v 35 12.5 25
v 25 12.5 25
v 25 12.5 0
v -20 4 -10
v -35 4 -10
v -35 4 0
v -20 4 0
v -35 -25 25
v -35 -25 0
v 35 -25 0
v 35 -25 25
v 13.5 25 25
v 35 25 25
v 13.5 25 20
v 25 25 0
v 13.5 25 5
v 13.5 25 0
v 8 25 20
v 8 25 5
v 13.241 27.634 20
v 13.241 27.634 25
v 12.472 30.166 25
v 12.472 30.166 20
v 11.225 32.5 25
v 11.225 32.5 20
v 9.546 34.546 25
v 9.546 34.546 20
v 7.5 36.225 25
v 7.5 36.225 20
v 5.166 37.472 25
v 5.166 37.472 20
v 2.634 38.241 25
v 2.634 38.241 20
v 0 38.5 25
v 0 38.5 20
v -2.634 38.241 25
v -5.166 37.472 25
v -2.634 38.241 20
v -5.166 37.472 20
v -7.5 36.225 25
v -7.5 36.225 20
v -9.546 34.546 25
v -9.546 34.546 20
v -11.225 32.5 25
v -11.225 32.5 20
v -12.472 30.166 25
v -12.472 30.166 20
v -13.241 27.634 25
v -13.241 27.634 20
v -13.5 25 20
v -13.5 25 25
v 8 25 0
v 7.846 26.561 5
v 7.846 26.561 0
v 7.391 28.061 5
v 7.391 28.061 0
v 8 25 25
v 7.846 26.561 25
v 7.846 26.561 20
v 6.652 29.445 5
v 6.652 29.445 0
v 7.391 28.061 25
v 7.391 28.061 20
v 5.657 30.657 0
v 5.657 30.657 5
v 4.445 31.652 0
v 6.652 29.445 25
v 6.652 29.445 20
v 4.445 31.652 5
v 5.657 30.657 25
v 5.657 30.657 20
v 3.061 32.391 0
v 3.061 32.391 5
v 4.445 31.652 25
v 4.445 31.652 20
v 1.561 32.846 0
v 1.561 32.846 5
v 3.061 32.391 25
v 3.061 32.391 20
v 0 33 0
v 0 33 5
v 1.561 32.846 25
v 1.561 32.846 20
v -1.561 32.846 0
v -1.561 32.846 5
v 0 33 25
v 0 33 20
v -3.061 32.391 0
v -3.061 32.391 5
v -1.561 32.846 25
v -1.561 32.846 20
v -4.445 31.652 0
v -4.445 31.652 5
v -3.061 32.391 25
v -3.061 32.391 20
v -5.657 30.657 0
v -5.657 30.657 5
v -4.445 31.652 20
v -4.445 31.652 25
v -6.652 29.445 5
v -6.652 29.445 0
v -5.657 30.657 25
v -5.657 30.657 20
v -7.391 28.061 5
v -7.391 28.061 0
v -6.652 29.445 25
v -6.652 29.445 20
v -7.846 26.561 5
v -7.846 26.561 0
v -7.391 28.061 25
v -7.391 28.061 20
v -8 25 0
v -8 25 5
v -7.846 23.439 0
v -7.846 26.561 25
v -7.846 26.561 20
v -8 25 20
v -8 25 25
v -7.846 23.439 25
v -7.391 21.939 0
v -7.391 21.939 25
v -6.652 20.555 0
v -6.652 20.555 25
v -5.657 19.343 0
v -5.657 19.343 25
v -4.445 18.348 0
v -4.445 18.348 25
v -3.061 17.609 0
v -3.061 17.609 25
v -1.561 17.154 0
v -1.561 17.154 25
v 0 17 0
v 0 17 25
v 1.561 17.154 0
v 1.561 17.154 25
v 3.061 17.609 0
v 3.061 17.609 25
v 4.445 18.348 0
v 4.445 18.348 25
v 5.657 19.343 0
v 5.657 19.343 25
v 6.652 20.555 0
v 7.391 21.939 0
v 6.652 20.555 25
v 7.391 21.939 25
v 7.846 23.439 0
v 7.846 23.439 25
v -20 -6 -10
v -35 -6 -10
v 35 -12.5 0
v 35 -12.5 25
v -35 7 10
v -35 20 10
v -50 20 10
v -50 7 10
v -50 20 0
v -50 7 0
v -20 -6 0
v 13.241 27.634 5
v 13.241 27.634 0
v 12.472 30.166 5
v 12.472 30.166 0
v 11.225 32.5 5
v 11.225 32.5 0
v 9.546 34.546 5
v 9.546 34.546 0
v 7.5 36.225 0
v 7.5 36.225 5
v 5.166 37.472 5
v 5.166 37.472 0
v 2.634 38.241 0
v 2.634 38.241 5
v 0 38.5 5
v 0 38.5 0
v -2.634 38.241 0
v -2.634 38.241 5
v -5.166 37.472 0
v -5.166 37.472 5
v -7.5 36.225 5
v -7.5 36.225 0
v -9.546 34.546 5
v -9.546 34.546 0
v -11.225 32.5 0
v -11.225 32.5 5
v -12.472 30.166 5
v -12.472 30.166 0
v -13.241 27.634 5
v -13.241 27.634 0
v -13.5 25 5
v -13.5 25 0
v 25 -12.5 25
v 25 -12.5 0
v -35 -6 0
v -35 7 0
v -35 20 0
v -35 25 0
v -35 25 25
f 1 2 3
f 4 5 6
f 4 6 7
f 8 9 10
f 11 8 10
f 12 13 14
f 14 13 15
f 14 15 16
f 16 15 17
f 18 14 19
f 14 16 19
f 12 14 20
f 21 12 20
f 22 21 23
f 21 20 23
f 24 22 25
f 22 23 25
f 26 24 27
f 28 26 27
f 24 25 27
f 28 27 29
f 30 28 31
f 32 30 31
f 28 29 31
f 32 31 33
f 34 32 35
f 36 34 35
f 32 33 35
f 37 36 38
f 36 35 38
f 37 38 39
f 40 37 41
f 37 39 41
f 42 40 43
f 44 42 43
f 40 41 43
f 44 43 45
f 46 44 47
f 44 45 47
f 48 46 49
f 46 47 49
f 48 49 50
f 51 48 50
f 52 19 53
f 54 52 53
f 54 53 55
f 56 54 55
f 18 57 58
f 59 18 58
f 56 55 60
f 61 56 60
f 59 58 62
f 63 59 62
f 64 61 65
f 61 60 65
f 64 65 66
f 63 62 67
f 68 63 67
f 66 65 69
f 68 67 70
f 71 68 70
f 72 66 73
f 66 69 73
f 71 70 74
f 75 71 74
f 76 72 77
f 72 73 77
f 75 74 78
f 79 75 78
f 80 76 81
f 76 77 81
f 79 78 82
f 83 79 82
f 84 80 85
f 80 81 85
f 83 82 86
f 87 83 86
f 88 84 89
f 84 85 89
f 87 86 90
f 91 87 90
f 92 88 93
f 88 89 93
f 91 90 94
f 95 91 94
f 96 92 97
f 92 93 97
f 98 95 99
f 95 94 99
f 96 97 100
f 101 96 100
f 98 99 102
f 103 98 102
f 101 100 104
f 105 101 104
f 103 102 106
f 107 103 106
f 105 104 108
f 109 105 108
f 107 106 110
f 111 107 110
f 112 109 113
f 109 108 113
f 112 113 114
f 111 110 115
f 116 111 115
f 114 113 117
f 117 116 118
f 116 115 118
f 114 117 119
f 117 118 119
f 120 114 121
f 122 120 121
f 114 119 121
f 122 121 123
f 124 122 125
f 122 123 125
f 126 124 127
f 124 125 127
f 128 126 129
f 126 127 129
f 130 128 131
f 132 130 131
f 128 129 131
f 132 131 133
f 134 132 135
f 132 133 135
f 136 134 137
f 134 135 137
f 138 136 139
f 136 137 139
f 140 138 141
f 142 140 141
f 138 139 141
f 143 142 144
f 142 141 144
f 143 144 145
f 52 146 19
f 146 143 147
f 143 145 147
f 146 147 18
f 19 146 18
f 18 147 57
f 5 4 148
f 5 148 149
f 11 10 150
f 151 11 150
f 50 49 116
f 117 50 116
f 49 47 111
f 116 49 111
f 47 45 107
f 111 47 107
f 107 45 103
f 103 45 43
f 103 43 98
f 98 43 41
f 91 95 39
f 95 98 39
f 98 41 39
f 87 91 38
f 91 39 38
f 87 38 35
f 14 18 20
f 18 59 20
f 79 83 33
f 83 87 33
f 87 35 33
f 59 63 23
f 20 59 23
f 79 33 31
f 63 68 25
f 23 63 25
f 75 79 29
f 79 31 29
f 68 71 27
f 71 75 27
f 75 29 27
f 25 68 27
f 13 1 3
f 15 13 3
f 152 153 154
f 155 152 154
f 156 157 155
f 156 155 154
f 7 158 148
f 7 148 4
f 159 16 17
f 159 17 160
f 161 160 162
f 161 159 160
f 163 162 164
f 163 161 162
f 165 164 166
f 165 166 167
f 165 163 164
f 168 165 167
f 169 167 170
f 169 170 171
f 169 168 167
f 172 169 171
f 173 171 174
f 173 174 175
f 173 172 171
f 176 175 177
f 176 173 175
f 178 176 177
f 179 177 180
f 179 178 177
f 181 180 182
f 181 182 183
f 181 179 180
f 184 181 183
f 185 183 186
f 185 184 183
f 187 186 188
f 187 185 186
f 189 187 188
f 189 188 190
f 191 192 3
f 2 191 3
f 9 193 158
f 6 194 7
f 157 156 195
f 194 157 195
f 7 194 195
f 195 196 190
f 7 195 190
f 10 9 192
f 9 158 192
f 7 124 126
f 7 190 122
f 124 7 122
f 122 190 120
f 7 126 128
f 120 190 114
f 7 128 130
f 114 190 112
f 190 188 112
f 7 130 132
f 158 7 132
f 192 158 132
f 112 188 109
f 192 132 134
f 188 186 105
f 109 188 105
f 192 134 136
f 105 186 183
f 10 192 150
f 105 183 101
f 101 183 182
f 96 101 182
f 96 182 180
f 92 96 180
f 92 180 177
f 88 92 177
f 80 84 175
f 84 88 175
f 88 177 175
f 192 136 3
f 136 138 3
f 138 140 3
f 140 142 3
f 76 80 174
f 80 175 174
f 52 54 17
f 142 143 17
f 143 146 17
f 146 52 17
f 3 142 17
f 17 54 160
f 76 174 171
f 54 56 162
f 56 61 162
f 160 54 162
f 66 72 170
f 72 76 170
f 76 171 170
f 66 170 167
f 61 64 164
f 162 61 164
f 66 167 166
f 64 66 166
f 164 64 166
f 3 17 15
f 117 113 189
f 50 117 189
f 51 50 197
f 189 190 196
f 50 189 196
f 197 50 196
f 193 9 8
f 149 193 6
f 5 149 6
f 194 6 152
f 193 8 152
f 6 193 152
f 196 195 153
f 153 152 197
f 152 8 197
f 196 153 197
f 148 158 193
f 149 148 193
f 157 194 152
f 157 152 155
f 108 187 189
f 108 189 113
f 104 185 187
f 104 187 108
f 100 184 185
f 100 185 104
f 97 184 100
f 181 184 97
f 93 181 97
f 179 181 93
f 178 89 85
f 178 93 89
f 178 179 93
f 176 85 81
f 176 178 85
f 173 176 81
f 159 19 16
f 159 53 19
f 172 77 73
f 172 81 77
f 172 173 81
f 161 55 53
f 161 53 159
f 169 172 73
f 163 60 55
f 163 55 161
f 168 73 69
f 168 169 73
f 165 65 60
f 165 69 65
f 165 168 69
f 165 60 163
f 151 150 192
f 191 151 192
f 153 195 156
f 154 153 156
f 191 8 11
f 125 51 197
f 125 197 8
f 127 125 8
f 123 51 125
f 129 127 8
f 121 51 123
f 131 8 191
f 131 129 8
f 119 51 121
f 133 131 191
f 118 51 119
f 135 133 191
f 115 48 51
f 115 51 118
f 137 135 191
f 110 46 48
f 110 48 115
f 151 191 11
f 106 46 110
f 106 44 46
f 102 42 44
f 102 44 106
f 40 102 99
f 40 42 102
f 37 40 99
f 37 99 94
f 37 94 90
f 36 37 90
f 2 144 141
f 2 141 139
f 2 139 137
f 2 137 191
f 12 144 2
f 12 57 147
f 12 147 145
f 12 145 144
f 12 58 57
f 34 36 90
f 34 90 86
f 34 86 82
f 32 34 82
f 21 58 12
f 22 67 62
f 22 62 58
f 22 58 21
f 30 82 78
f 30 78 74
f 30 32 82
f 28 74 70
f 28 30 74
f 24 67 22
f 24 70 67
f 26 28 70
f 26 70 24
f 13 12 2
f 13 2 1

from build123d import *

# Parameters (mm, degrees)
EXTRUDE_1_DEPTH     = 25
EXTRUDE_START       = -5
SKETCH_3_R          = 13.5
SKETCH_3_R_2        = 8
EXTRUDE_2_DEPTH     = 5
CUT_EXTRUDE_1_DEPTH = 58.063561053
SKETCH_5_W          = 10
SKETCH_5_H          = 14
EXTRUDE_3_DEPTH     = 11
SKETCH_6_W          = 15
SKETCH_6_H          = 13
EXTRUDE_4_DEPTH     = 10
SKETCH_7_W          = 10
SKETCH_7_H          = 14
CUT_EXTRUDE_2_DEPTH = 11
SKETCH_8_W          = 15
SKETCH_8_H          = 13
EXTRUDE_5_DEPTH     = 10
SKETCH_9_W          = 15
SKETCH_9_H          = 10
CUT_EXTRUDE_3_DEPTH = 3
EXTRUDE_6_DEPTH     = 25


with BuildPart() as part:
    # Эскиз1 → Бобышка-Вытянуть1 (new body)
    with BuildSketch(Plane.XY):
        with BuildLine():
            Line((-35, 25), (-35, -25))
            Line((-35, -25), (35, -25))
            Line((35, -25), (35, -12.5))
            Line((35, -12.5), (25, -12.5))
            Line((25, -12.5), (25, 12.5))
            Line((25, 12.5), (35, 12.5))
            Line((35, 12.5), (35, 25))
            Line((35, 25), (8, 25))
            ThreePointArc((8, 25), (0, 17), (-8, 25))
            Line((-8, 25), (-35, 25))
        make_face()
        Polygon((4, -19), (-4, -19), (-4, -4), (-4, 4), (0, 4), (0, -4), (4, -4), align=None, mode=Mode.SUBTRACT)
    extrude(amount=EXTRUDE_1_DEPTH)

    # Эскиз3 → Бобышка-Вытянуть2 (add)
    with BuildSketch(Plane.XY.offset(25).offset(EXTRUDE_START)):
        with Locations((0, 25)):
            Circle(SKETCH_3_R)
        with Locations((0, 25)):
            Circle(SKETCH_3_R_2, mode=Mode.SUBTRACT)
    extrude_2 = extrude(amount=EXTRUDE_2_DEPTH)

    # Эскиз4 → Вырез-Вытянуть1 (cut, through all)
    with BuildSketch(Plane.XZ.offset(-12.5)):
        Polygon((35, 25), (25, 0), (35, 0), align=None)
    extrude(amount=-CUT_EXTRUDE_1_DEPTH, mode=Mode.SUBTRACT)

    # Эскиз5 → Бобышка-Вытянуть3 (add)
    with BuildSketch(Plane.XY.offset(25)):
        with Locations((-30, 0)):
            Rectangle(SKETCH_5_W, SKETCH_5_H)
    extrude(amount=EXTRUDE_3_DEPTH)

    # Эскиз6 → Бобышка-Вытянуть4 (add)
    with BuildSketch(Plane(origin=(0, 0, 0), x_dir=(-1, 0, 0), z_dir=(0, 0, -1))):
        with Locations((42.5, 13.5)):
            Rectangle(SKETCH_6_W, SKETCH_6_H)
    extrude(amount=-EXTRUDE_4_DEPTH)

    # Эскиз7 → Вырез-Вытянуть2 (cut)
    with BuildSketch(Plane.XY.offset(36)):
        with Locations((-30, 0)):
            Rectangle(SKETCH_7_W, SKETCH_7_H)
    extrude(amount=-CUT_EXTRUDE_2_DEPTH, mode=Mode.SUBTRACT)

    # Эскиз8 → Бобышка-Вытянуть5 (add)
    with BuildSketch(Plane(origin=(0, 0, 0), x_dir=(-1, 0, 0), z_dir=(0, 0, -1))):
        with Locations((27.5, 0.5)):
            Rectangle(SKETCH_8_W, SKETCH_8_H)
    extrude(amount=EXTRUDE_5_DEPTH)

    # Эскиз9 → Вырез-Вытянуть3 (cut)
    with BuildSketch(Plane(origin=(0, 7, 0), x_dir=(1, 0, 0), z_dir=(0, 1, 0))):
        with Locations((-27.5, 5)):
            Rectangle(SKETCH_9_W, SKETCH_9_H)
    extrude(amount=-CUT_EXTRUDE_3_DEPTH, mode=Mode.SUBTRACT)

    # Эскиз10 → Бобышка-Вытянуть6 (add)
    with BuildSketch(Plane(origin=(0, 0, 0), x_dir=(-1, 0, 0), z_dir=(0, 0, -1))):
        Polygon((4, -19), (4, 4), (0, 4), (0, -4), (-4, -4), (-4, -19), align=None)
    extrude(amount=-EXTRUDE_6_DEPTH)

    # Зеркальное отражение1: Бобышка-Вытянуть2 across plane
    add(extrude_2.mirror(Plane(origin=(0, 0, 12.5), x_dir=(1, 0, 0), z_dir=(0, 0, -1))))


solid = part.part
